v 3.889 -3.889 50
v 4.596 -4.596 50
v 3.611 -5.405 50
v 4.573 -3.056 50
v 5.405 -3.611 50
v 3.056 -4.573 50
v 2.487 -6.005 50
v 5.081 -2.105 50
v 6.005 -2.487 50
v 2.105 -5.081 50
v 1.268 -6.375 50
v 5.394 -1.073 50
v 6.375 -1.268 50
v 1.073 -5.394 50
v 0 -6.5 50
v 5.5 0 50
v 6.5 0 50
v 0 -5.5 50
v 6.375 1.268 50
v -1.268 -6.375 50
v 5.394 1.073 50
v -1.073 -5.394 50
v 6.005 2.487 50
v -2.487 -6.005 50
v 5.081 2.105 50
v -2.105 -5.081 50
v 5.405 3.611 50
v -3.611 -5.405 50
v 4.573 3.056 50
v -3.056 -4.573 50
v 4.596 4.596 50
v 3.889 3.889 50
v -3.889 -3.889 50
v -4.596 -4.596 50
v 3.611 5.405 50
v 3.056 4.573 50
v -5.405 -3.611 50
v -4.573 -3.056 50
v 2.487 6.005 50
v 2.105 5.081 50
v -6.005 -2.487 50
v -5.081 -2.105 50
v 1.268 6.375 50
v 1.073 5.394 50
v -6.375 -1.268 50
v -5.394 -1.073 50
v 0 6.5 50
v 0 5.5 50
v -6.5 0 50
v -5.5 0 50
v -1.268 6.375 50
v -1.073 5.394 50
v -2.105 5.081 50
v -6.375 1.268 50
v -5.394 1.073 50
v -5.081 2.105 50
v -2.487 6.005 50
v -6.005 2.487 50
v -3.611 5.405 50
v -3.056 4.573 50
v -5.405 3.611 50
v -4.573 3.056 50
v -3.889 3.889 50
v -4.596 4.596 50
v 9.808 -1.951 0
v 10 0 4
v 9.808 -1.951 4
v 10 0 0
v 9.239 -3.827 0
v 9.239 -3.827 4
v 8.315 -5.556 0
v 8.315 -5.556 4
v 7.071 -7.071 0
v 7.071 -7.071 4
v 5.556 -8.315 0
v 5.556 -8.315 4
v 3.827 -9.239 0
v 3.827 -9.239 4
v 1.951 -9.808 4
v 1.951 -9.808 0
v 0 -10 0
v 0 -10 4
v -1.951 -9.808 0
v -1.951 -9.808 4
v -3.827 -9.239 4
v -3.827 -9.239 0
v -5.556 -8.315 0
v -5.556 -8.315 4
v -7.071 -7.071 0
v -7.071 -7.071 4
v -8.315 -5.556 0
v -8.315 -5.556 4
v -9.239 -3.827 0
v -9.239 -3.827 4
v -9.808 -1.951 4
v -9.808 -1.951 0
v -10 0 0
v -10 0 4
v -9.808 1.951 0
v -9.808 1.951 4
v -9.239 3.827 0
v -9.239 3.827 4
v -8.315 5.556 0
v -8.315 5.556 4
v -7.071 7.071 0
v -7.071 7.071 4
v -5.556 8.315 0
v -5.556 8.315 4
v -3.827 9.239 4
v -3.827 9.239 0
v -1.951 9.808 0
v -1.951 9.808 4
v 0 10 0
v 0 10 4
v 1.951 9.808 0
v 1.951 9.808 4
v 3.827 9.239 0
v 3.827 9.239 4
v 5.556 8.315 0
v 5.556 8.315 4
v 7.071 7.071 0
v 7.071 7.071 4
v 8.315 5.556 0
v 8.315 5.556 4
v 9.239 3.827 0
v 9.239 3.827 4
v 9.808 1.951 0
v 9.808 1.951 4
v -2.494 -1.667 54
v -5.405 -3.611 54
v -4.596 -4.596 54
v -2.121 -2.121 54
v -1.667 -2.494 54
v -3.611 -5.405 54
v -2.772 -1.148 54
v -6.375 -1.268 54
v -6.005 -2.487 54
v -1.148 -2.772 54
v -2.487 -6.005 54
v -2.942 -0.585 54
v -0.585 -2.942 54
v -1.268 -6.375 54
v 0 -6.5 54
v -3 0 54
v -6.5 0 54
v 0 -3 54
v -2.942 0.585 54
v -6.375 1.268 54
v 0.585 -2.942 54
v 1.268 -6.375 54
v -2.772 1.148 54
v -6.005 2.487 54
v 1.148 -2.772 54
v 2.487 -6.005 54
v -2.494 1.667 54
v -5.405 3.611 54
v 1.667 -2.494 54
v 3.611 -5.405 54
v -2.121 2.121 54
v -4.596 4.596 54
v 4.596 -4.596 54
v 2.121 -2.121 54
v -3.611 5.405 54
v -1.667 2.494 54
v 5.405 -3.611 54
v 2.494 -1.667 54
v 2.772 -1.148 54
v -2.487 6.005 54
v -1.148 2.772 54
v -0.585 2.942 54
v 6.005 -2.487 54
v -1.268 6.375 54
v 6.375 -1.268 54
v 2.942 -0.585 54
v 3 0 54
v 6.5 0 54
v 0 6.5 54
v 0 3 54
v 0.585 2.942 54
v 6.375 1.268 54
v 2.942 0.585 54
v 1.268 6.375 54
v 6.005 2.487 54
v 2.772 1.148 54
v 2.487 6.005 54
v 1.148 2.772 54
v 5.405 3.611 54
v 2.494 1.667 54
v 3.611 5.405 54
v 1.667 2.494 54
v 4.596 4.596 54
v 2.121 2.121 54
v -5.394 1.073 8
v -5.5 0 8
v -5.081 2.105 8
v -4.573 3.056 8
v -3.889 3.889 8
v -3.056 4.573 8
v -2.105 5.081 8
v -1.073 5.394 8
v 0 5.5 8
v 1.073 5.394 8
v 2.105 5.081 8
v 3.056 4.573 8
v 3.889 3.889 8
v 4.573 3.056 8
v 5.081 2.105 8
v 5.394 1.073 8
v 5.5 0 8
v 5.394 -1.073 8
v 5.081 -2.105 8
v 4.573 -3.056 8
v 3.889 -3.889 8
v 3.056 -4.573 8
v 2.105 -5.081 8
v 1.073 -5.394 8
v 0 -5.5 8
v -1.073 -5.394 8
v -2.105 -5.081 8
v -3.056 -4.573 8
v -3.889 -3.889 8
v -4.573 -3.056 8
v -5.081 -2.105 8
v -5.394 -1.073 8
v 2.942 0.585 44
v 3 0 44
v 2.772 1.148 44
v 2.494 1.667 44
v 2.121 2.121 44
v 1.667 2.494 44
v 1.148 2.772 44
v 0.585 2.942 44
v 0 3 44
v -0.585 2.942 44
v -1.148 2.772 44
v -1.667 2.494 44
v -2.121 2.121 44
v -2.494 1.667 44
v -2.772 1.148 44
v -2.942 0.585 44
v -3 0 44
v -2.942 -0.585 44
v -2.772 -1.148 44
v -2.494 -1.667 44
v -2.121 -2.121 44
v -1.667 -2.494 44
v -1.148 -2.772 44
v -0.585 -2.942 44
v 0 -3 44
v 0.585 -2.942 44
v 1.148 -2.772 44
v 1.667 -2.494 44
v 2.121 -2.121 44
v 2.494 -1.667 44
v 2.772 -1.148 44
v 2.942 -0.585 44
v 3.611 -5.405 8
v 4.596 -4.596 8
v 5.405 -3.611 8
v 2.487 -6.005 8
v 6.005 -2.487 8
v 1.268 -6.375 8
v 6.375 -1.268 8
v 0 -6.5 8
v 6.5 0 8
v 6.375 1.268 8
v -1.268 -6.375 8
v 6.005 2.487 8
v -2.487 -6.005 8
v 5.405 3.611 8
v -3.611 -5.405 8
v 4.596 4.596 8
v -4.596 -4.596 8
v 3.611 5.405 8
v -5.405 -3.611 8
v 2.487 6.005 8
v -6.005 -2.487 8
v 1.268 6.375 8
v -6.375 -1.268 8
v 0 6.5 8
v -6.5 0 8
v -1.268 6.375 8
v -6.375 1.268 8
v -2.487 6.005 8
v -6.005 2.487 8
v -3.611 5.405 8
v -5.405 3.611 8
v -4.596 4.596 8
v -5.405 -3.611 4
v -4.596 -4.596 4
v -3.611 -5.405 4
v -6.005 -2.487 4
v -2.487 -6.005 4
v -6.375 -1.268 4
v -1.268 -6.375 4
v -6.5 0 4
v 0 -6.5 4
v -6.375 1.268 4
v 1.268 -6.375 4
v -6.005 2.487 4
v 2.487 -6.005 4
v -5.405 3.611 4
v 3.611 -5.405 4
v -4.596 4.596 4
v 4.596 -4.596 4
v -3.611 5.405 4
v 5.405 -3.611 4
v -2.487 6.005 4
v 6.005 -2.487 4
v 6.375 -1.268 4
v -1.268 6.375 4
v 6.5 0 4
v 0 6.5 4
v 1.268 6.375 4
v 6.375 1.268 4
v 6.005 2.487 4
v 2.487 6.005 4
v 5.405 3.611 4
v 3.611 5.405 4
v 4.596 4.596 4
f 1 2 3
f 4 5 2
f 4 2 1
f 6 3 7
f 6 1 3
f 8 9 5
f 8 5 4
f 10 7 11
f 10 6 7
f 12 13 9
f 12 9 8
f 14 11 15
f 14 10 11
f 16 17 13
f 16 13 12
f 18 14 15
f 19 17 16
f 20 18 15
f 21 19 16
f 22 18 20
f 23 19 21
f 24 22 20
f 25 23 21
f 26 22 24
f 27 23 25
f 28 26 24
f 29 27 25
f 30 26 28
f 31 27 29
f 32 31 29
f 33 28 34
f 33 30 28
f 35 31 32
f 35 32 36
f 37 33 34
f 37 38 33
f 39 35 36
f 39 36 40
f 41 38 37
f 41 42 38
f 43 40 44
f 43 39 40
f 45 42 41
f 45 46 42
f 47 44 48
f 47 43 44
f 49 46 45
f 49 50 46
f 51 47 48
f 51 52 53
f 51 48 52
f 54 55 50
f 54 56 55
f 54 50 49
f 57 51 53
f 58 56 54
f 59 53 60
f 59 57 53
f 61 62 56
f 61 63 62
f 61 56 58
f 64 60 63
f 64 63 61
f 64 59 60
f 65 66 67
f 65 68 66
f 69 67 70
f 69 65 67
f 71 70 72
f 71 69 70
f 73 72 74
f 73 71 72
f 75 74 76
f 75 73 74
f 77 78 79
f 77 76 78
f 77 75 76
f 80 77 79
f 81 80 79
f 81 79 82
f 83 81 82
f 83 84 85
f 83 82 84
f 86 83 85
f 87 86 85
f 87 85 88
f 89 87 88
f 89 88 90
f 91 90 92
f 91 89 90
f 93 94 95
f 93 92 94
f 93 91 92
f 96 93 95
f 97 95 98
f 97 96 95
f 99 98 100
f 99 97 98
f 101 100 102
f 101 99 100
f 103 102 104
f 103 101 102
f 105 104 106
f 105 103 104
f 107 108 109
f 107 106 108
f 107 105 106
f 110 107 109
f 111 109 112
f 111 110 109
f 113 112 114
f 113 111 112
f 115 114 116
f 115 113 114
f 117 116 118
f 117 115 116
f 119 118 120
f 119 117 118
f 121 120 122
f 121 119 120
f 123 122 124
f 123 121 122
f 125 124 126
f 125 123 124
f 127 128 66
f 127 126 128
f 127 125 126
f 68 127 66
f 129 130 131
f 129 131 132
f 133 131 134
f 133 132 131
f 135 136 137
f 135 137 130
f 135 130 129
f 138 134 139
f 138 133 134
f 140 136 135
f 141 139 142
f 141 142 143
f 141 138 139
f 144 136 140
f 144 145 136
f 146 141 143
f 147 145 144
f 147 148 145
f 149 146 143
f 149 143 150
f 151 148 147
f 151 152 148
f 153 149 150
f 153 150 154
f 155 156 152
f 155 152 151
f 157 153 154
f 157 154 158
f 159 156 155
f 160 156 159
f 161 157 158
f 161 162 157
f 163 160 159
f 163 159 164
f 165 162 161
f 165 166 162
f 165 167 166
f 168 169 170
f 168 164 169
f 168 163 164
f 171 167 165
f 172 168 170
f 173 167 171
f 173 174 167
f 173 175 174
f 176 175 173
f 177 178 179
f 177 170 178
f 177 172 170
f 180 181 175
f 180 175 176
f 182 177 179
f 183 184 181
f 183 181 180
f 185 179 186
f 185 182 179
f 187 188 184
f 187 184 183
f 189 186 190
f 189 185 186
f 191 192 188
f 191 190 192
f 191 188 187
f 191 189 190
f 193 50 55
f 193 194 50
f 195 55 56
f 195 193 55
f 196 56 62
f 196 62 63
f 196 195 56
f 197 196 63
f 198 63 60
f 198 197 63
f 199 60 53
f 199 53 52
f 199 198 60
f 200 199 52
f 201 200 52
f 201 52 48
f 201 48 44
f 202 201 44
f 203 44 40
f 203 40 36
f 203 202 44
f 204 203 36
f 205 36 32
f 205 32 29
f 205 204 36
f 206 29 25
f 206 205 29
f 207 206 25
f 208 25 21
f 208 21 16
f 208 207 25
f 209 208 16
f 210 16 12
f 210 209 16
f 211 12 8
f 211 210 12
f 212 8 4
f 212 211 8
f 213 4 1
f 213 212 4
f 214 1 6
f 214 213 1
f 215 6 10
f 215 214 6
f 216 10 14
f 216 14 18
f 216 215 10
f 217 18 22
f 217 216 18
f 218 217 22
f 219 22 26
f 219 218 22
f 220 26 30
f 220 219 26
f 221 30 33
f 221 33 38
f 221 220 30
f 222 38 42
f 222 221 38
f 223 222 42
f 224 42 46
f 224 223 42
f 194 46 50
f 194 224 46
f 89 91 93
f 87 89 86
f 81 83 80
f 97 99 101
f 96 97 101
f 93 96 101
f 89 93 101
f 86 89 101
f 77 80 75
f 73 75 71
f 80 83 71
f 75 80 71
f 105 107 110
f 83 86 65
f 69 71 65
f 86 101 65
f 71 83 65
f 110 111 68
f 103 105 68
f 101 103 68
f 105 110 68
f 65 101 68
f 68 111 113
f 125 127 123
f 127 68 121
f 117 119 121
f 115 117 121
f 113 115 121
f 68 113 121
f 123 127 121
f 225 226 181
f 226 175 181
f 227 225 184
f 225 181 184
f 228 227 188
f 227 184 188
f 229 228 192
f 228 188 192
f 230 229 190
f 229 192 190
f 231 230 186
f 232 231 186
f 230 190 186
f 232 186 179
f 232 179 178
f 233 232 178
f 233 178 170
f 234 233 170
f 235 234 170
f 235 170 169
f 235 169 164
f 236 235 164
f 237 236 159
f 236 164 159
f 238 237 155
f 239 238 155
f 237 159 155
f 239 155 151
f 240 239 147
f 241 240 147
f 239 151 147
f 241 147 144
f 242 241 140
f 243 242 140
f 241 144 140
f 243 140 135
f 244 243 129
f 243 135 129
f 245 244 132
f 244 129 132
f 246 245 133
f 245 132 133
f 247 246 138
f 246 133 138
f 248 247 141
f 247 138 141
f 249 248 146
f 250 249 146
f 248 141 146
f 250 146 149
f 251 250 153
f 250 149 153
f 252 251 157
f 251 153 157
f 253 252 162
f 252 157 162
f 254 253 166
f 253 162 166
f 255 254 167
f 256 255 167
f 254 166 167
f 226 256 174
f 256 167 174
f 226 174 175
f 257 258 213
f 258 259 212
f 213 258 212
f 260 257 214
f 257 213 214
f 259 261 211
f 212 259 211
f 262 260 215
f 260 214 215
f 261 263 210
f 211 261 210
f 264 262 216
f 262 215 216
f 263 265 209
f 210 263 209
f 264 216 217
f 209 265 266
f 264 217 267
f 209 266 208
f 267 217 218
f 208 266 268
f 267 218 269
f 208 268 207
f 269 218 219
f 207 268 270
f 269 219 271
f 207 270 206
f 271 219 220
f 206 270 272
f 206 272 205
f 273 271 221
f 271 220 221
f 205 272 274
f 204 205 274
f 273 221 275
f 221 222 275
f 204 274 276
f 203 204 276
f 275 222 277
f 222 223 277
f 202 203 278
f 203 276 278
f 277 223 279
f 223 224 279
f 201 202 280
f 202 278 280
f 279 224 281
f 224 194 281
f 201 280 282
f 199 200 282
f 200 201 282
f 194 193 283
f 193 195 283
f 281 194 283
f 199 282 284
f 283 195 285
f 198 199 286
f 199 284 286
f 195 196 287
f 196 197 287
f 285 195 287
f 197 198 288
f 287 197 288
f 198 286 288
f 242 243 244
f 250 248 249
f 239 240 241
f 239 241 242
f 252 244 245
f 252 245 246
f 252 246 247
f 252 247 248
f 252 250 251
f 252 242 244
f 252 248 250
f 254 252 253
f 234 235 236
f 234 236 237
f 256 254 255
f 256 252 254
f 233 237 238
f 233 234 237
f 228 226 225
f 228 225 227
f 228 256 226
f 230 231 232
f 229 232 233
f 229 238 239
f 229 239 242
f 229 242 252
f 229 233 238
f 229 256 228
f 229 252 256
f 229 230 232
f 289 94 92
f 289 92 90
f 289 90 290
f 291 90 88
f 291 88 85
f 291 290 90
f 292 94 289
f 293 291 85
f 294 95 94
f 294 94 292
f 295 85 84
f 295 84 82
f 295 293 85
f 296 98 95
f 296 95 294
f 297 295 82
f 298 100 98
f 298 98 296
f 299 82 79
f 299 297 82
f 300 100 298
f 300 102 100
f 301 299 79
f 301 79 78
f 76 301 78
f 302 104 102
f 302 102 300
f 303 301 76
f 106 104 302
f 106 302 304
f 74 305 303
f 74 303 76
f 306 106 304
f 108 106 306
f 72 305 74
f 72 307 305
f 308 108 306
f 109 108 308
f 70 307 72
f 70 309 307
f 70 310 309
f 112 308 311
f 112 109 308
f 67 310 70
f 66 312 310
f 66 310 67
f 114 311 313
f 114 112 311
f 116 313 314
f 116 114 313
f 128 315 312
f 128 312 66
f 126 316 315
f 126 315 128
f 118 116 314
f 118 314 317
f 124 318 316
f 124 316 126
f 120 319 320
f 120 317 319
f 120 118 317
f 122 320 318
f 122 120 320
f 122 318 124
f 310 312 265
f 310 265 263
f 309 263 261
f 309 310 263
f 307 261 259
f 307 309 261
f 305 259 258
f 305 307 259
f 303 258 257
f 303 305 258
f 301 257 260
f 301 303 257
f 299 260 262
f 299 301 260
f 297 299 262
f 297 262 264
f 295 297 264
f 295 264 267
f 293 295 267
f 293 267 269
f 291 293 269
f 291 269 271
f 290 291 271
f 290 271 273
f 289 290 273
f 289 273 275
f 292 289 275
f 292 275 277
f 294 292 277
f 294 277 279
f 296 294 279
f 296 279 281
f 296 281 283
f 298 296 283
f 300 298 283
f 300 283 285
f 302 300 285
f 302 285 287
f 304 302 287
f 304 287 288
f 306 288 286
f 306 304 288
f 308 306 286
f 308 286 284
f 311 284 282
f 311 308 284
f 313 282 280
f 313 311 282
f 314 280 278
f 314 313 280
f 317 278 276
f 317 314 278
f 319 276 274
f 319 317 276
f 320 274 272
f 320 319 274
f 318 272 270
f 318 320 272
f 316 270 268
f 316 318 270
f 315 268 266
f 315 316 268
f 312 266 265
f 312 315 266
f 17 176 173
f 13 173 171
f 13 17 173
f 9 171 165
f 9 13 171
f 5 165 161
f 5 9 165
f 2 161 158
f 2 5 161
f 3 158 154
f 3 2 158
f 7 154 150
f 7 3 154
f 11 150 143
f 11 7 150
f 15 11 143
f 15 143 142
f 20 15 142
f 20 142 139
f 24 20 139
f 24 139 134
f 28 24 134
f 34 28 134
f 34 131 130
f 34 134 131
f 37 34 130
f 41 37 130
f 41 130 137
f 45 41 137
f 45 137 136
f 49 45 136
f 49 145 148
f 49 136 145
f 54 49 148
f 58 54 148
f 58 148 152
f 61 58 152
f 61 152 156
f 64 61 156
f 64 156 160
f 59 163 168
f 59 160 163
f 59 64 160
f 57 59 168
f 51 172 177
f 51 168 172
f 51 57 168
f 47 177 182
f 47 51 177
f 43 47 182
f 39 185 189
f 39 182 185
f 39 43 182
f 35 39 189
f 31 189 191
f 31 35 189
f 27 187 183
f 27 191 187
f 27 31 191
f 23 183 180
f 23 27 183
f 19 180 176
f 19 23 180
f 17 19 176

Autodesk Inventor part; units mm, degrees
ref_plane "YZ Plane" through (0, 0, 0) normal (1, 0, 0) x (0, 1, 0)
ref_plane "XZ Plane" through (0, 0, 0) normal (0, 1, 0) x (-1, 0, 0)
ref_plane "XY Plane" through (0, 0, 0) normal (0, 0, 1) x (1, 0, 0)
sketch "Boceto1" plane through (0, 0, 0) normal (0, 0, 1) x (1, 0, 0)
  circle A0 centre (0, 0) radius 10
  dimension "d0" = 20
extrude "Extrusión1" add sketch "Boceto1" along normal blind 4
sketch "Boceto2" plane through (0, 0, 4) normal (0, 0, 1) x (1, 0, 0)
  circle A0 centre (0, 0) radius 6.5
  dimension "d3" = 13
extrude "Extrusión2" add sketch "Boceto2" along normal blind 50
sketch "Boceto3" plane through (0, 0, 0) normal (0, 1, 0) x (-1, 0, 0)
  line L0 (6.5, 50) -> (5.5, 50)
  line L1 (5.5, 50) -> (5.5, 8)
  line L2 (5.5, 8) -> (6.5, 8)
  line L3 (0, 30.7495) -> (0, -2.427)
  line L4 (10, 4) -> (-10, 4) projected
  line L5 (6.5, 4) -> (6.5, 54) projected
  point P0 (0, 0)
  dimension "d6" = 1
  dimension "d7" = 4
  dimension "d8" = 4
revolve "Revolución1" cut sketch "Boceto3" angle 360 about axis through (0, 0, 30.7495) along (0, 0, -1)
sketch "Boceto4" plane through (0, 0, 54) normal (0, 0, 1) x (1, 0, 0)
  circle A0 centre (0, 0) radius 3
  dimension "d10" = 6
extrude "Extrusión3" cut sketch "Boceto4" against normal blind 10
properties part number "steering_stand_off_bush" material "Hierro, gris"
